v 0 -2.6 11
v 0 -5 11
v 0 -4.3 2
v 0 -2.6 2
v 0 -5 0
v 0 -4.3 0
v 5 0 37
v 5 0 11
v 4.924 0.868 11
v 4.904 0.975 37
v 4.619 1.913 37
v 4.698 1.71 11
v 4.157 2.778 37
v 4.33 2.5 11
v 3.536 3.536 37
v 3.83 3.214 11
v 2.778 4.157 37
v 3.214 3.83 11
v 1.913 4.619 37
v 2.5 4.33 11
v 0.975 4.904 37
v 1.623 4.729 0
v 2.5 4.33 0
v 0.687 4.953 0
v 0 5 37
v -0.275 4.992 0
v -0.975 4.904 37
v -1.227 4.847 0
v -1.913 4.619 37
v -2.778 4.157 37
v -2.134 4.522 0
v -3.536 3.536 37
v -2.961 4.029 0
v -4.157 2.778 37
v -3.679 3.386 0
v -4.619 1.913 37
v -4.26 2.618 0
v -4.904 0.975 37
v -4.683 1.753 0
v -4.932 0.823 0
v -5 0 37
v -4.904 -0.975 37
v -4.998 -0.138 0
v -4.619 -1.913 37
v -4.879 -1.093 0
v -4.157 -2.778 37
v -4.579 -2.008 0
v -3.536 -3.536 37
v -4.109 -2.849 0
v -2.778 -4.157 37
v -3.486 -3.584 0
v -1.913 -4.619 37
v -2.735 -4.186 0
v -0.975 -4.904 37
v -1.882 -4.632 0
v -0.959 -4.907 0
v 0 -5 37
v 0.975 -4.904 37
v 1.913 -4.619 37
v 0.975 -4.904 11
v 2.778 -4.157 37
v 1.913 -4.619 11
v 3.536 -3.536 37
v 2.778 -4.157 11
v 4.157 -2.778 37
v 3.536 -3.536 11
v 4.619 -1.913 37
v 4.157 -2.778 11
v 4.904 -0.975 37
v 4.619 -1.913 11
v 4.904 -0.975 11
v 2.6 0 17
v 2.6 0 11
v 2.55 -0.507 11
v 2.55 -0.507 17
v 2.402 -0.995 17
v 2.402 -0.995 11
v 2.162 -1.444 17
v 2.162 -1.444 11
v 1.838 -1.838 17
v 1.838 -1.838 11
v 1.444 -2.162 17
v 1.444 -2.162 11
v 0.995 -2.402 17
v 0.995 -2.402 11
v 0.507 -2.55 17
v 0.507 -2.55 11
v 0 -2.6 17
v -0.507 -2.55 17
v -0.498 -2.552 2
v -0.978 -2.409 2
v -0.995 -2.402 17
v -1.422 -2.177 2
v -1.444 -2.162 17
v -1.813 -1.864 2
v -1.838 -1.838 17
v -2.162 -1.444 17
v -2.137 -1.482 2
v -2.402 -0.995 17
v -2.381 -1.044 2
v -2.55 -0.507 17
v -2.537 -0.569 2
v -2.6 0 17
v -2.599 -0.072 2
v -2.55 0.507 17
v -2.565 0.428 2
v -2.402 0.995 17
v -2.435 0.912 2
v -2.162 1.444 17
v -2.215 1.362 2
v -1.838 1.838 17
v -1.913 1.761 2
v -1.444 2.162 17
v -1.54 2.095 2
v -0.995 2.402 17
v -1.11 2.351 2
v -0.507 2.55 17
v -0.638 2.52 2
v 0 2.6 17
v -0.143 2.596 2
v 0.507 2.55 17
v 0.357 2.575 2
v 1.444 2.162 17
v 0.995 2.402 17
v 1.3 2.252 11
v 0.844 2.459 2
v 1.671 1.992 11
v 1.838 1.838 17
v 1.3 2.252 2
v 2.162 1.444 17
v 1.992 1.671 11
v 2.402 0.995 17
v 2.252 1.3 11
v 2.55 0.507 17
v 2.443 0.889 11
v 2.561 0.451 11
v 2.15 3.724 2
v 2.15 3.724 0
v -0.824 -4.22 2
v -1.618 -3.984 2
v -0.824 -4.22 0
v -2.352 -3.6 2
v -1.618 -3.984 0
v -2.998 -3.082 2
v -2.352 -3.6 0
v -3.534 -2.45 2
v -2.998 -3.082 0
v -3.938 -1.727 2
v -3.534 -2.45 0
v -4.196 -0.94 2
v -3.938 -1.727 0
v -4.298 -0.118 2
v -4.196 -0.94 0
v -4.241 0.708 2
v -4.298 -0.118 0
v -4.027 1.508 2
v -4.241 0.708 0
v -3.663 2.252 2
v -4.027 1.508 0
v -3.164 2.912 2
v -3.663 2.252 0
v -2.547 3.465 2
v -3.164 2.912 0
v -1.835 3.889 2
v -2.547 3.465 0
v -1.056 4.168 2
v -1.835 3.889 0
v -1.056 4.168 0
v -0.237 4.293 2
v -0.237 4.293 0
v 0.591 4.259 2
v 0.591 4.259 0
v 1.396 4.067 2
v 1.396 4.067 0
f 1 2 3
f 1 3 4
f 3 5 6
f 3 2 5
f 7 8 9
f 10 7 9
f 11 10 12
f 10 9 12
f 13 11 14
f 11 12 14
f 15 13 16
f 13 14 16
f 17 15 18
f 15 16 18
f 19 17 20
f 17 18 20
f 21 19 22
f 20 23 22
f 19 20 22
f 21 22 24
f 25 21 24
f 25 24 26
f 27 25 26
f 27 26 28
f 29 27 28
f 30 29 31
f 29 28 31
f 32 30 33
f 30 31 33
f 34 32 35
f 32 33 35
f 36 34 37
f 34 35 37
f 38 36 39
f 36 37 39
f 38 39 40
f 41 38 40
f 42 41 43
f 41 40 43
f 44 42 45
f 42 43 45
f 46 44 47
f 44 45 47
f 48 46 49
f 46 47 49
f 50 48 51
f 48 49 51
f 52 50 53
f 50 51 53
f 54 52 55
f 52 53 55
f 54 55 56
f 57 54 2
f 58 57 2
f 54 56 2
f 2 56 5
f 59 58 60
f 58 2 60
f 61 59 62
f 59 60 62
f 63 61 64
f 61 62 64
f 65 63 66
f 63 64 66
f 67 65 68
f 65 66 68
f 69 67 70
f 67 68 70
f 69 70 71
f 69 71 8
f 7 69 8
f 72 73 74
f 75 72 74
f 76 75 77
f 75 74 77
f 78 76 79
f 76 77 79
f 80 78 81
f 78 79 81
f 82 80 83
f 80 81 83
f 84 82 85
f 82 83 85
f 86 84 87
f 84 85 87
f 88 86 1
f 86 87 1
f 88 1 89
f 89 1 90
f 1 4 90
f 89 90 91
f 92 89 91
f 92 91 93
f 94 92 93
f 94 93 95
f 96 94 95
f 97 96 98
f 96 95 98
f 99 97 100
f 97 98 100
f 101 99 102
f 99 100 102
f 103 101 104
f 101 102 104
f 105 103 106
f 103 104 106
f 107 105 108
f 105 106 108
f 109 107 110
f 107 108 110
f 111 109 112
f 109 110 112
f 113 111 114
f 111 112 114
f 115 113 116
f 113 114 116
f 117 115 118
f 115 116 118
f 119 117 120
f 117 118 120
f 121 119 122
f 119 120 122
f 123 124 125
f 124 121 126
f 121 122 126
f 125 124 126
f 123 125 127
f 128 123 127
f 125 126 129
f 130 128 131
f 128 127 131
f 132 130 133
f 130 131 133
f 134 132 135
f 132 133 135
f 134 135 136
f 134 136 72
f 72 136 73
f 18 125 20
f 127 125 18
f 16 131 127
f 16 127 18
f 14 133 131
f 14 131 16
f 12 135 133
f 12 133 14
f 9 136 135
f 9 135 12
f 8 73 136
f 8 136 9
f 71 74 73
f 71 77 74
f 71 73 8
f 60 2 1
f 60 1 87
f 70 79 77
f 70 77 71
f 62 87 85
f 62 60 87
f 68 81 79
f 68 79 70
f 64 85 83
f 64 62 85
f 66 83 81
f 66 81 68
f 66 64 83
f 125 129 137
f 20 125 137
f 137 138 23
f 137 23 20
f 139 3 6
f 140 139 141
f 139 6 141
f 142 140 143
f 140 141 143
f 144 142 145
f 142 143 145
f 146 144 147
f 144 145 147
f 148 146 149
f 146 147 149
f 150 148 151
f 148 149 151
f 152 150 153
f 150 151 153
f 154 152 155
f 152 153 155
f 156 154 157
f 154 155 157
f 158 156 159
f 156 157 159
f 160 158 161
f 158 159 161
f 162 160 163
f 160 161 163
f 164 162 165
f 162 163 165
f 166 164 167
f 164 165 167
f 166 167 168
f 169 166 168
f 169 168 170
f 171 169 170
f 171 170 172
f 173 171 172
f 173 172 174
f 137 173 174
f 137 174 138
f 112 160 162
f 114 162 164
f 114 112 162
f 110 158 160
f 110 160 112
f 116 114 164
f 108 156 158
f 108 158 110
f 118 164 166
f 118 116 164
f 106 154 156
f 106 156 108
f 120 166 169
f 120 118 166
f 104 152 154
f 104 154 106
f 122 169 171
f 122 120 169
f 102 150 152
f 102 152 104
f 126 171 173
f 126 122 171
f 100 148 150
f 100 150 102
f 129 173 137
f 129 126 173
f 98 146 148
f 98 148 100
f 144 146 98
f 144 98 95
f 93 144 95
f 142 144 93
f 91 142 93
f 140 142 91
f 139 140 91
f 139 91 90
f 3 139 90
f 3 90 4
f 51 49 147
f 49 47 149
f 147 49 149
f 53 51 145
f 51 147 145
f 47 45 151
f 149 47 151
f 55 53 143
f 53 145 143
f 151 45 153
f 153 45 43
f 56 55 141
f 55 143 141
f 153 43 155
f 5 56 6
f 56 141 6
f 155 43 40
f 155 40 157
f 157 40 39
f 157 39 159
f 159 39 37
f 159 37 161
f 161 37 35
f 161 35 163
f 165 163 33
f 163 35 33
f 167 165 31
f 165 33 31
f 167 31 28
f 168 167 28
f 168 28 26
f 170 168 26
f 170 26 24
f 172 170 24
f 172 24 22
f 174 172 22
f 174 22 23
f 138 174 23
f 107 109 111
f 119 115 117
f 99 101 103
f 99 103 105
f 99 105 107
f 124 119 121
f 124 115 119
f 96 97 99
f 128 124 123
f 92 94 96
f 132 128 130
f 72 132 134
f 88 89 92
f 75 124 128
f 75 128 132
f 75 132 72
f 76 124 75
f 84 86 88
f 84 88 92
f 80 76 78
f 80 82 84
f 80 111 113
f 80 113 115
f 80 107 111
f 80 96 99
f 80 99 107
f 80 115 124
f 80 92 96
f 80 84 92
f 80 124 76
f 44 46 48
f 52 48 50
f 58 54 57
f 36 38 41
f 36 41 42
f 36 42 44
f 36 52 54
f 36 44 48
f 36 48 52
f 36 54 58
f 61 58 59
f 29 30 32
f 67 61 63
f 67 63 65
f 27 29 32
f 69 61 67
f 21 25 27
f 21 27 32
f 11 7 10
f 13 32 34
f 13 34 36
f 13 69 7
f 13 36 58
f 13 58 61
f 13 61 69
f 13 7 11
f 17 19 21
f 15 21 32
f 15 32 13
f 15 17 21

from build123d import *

# Parameters (mm, degrees)
F0_R     = 5
F1_DEPTH = 37
F2_R     = 4.3
F3_DEPTH = 2
F4_R     = 2.6
F5_DEPTH = 15
F7_DEPTH = 11


with BuildPart() as f1:
    # F0 (on Top) → F1 (new body)
    with BuildSketch(Plane.XY):
        Circle(F0_R)
    extrude(amount=F1_DEPTH)

    # F2 (on face) → F3 (cut)
    with BuildSketch(Plane(origin=(0, 0, 0), x_dir=(1, 0, 0), z_dir=(0, 0, -1))):
        Circle(F2_R)
    extrude(amount=-F3_DEPTH, mode=Mode.SUBTRACT)

    # F4 (on face) → F5 (cut)
    with BuildSketch(Plane(origin=(0, 0, 2), x_dir=(1, 0, 0), z_dir=(0, 0, -1))):
        Circle(F4_R)
    extrude(amount=-F5_DEPTH, mode=Mode.SUBTRACT)

    # F6 (on face) → F7 (cut)
    with BuildSketch(Plane(origin=(0, 0, 0), x_dir=(1, 0, 0), z_dir=(0, 0, -1))):
        with BuildLine():
            Line((0, 5), (0, 0))
            Line((0, 0), (2.5, -4.330127))
            ThreePointArc((2.5, -4.330127), (4.829629, 1.294095), (0, 5))
        make_face()
    extrude(amount=-F7_DEPTH, mode=Mode.SUBTRACT)


solid = f1.part
